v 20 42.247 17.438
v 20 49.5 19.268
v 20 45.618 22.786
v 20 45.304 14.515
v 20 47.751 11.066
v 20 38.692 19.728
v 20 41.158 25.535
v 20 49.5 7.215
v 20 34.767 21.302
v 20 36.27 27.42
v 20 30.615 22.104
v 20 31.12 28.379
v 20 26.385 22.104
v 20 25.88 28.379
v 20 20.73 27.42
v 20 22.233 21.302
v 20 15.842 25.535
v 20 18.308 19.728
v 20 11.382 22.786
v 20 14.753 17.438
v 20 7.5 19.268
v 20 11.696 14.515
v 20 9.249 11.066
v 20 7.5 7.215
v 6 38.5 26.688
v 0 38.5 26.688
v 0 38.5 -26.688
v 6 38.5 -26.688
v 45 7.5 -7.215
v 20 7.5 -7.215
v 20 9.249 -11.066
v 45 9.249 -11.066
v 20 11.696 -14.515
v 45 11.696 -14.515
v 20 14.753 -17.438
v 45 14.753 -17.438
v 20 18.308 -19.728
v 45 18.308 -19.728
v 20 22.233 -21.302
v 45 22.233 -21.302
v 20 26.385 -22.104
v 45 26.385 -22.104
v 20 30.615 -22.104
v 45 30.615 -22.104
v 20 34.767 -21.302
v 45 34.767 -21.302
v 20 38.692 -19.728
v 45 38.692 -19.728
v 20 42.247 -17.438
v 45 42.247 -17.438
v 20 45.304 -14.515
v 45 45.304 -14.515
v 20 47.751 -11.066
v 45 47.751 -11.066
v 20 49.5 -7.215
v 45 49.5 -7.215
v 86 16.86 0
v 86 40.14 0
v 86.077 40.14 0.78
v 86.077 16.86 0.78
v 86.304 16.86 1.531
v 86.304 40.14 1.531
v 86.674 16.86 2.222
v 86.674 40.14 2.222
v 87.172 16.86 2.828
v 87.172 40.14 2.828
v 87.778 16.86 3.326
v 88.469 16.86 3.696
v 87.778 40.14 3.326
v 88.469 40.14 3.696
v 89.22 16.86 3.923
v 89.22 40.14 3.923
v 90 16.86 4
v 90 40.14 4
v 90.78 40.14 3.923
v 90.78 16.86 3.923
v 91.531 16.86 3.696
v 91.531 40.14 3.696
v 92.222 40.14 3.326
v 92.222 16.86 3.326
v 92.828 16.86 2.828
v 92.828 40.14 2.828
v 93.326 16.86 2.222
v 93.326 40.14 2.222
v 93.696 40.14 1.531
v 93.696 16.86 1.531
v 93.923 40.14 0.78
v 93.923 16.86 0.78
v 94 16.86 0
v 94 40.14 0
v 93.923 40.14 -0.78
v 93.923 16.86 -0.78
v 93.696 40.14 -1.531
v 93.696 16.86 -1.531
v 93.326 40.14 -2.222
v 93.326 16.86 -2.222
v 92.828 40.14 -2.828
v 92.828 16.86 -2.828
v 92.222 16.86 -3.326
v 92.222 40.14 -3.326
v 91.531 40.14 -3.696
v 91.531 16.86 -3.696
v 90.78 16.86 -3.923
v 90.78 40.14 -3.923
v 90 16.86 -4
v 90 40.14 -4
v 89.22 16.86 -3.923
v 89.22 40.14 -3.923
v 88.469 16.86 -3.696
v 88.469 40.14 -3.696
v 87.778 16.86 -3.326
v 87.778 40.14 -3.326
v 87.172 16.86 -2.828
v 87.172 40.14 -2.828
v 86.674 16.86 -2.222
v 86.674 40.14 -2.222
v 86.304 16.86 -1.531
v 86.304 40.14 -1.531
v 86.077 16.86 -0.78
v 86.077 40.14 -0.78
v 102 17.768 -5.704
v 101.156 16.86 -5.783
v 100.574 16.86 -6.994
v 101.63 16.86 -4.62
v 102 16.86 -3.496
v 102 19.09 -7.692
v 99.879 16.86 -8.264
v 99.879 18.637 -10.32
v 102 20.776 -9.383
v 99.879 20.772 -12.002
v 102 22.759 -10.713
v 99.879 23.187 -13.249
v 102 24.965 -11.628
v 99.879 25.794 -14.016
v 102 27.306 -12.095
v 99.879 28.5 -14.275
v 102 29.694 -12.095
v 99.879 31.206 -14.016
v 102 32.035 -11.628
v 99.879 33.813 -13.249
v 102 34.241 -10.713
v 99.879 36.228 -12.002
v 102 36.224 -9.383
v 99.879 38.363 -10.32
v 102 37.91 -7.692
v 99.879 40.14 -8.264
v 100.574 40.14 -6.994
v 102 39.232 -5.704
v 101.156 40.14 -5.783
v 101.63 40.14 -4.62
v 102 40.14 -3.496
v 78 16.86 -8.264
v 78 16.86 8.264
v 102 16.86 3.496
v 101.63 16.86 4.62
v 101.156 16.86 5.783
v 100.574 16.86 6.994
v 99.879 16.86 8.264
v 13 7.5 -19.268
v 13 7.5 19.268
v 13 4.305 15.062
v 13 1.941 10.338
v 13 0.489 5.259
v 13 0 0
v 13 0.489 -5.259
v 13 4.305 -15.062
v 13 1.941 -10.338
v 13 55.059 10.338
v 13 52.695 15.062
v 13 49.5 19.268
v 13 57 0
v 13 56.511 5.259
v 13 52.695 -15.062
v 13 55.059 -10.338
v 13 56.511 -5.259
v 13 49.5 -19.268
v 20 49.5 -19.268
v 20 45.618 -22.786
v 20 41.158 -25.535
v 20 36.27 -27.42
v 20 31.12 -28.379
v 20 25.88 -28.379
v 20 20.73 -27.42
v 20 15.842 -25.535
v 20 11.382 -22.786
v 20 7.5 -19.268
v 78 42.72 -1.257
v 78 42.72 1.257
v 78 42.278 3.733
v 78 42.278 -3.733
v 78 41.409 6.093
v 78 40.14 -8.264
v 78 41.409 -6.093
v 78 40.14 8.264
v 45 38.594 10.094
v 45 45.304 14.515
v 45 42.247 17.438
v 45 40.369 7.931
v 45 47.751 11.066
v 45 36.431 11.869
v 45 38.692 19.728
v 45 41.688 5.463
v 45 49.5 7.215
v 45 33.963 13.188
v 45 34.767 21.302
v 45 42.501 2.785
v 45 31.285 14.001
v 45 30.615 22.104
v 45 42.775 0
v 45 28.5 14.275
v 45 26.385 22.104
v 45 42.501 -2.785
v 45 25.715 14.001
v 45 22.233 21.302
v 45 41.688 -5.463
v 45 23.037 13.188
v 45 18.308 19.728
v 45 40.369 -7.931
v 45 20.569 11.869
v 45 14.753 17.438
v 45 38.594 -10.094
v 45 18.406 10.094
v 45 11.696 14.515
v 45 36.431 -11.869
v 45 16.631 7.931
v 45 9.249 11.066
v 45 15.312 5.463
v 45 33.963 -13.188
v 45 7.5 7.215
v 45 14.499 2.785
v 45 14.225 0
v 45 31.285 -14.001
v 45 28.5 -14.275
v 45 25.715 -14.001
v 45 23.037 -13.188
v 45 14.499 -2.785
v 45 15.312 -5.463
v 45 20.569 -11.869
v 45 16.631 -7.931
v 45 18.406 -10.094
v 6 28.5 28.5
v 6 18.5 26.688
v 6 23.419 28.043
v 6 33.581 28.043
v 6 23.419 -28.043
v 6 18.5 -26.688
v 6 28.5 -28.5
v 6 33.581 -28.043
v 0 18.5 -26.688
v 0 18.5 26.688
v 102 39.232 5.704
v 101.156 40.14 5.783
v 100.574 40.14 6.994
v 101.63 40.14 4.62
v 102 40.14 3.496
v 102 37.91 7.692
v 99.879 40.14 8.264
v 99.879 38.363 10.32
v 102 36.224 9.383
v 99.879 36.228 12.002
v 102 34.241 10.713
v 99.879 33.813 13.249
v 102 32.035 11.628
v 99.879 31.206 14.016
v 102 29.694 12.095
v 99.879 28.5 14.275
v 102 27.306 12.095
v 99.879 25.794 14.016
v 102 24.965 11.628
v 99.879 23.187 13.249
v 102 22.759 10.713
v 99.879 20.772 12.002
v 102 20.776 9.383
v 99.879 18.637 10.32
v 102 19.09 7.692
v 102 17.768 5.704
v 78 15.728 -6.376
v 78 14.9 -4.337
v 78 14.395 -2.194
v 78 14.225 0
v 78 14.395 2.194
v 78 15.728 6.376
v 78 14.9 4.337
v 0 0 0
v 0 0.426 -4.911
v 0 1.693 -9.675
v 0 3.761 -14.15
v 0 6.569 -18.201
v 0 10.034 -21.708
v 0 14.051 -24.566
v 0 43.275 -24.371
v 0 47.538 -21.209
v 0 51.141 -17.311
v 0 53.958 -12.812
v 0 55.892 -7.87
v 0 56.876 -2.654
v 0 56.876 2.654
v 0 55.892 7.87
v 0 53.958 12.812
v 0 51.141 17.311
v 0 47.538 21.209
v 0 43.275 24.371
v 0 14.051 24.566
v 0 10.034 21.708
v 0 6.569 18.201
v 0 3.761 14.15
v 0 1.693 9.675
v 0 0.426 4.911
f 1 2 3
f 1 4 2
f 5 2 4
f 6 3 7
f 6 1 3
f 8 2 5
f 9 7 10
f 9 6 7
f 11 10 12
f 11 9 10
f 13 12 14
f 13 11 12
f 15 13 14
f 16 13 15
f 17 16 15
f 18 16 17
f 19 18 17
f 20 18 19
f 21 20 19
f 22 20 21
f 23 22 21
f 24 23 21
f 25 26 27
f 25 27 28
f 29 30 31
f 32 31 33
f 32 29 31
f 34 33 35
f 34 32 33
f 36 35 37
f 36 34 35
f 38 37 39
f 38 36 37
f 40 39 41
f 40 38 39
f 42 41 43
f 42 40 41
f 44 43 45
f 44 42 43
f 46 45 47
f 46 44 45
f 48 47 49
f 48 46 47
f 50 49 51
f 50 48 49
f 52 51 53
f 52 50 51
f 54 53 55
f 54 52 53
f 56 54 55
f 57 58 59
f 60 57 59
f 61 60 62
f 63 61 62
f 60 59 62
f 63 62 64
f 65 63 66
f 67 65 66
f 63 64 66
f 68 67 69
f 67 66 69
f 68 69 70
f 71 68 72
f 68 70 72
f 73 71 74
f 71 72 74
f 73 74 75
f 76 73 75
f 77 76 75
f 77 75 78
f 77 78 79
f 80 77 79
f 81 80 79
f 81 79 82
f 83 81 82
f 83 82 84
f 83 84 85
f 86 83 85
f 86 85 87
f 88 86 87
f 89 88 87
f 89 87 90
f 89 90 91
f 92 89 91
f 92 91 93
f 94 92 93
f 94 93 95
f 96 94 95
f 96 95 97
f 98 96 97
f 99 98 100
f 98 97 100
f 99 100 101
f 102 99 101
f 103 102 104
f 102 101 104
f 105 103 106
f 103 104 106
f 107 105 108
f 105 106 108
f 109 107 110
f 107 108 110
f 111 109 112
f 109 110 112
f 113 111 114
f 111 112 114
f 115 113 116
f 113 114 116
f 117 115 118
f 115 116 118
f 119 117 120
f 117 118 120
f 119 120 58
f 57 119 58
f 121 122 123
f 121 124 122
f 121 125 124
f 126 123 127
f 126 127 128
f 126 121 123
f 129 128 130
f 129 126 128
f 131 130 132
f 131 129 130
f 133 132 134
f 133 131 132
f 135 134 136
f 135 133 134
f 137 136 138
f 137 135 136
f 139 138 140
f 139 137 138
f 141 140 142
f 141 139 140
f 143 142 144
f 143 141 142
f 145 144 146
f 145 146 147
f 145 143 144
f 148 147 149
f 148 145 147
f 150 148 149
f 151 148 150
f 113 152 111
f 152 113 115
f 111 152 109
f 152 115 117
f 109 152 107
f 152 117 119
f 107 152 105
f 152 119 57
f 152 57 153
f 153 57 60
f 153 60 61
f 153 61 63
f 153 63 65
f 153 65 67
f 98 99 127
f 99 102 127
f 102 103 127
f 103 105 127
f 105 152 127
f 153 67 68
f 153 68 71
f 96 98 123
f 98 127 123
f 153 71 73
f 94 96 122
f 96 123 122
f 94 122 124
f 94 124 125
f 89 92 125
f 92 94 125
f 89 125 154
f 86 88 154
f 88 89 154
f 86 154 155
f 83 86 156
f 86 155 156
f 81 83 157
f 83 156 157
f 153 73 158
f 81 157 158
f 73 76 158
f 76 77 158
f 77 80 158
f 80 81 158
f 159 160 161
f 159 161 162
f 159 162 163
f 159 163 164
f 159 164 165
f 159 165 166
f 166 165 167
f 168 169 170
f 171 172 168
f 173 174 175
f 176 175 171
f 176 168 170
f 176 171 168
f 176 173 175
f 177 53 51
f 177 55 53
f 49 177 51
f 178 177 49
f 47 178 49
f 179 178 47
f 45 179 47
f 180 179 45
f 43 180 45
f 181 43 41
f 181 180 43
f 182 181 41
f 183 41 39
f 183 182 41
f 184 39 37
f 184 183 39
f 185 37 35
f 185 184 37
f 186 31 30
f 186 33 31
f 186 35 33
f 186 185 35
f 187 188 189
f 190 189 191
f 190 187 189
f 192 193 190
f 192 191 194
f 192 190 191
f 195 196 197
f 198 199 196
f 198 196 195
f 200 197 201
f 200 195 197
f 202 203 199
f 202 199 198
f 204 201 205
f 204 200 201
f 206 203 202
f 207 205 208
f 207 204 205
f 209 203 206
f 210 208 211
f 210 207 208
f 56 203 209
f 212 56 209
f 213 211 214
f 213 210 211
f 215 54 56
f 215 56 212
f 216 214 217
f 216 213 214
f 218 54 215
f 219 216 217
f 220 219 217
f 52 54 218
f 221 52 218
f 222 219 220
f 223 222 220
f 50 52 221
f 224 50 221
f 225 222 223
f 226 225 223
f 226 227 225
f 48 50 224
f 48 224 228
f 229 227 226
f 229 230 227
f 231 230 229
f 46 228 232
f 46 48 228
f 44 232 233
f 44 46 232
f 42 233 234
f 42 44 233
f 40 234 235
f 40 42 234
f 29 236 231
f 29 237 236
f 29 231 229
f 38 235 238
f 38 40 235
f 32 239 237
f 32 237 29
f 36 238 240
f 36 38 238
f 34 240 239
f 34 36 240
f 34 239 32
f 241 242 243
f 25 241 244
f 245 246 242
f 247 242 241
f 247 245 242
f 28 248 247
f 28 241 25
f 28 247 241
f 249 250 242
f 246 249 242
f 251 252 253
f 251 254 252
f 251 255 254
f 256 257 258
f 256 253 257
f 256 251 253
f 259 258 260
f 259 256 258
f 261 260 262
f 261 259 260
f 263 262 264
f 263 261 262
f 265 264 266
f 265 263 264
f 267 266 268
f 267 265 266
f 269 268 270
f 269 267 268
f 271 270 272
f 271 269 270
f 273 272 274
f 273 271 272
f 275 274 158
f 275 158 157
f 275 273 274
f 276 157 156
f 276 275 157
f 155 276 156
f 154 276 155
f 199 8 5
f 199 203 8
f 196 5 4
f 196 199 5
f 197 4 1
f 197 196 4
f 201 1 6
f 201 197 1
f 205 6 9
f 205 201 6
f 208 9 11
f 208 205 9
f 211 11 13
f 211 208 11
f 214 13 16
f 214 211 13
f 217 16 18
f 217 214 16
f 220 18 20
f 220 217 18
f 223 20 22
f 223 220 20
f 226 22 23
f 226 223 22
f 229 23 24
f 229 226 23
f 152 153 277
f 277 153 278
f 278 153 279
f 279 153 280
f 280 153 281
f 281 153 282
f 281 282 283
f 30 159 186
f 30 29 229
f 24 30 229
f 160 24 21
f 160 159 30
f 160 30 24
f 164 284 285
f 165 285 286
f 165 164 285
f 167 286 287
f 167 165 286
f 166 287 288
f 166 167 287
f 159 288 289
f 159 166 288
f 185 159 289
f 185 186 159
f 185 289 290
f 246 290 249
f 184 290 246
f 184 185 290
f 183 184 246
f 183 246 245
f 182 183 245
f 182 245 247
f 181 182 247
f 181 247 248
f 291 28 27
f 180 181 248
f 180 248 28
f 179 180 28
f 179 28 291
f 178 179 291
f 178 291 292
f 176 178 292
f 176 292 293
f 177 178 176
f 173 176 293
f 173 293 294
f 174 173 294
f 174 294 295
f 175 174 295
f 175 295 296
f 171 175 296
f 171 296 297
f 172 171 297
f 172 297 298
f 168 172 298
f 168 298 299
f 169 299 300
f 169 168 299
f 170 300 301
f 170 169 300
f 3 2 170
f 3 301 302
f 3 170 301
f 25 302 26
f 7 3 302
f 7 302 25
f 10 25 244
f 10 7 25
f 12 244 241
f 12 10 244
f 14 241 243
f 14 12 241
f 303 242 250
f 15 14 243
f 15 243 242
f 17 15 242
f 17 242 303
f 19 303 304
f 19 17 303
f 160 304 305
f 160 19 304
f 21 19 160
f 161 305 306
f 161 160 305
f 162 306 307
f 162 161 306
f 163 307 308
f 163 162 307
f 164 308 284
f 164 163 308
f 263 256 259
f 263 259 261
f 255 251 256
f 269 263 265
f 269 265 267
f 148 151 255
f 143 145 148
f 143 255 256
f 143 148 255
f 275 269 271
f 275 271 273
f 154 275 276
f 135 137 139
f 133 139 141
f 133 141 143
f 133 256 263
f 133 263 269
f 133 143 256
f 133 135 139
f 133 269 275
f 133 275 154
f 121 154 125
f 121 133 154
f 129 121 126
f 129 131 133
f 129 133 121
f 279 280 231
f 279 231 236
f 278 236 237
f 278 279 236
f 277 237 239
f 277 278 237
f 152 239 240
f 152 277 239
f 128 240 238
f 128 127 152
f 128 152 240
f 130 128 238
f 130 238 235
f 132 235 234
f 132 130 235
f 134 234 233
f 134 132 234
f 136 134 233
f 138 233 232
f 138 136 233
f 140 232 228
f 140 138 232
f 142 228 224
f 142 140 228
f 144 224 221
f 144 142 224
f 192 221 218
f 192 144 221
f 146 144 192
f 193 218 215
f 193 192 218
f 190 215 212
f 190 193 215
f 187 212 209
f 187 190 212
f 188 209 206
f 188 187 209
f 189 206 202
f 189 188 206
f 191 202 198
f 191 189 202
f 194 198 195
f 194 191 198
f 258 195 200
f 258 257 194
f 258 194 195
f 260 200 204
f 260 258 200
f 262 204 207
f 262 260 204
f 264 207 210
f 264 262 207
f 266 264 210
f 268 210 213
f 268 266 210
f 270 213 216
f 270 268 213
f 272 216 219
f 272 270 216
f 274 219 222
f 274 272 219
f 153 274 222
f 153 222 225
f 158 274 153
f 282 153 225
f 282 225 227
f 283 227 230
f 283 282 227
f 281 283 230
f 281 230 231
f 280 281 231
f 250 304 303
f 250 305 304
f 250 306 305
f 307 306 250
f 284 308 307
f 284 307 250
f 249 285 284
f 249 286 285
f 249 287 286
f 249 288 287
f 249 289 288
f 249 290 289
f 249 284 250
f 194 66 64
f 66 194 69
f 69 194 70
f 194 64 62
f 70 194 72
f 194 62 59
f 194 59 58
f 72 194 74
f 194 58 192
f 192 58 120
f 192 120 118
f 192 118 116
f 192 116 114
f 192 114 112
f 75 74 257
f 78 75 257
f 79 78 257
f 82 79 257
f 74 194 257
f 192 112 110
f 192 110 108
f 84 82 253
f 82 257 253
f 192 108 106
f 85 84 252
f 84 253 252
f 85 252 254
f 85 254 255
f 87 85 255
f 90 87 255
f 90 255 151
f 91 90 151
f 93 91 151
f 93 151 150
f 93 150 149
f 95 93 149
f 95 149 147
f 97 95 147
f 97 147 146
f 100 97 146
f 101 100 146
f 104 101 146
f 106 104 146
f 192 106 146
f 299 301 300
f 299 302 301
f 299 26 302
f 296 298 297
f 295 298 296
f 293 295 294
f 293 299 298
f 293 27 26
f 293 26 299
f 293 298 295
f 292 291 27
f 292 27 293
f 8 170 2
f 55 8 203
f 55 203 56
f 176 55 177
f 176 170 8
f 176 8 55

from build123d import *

# Parameters (mm, degrees)
CUT_EXTRUDE1_DEPTH      = 121.271567712
CUT_EXTRUDE1_DEPTH_BACK = 121.271567712
SKETCH1_6_W             = 6
SKETCH1_6_H             = 20
CUT_EXTRUDE2_DEPTH      = 24
SKETCH3_R               = 4
CUT_EXTRUDE3_DEPTH      = 114.258419555
CUT_EXTRUDE4_DEPTH      = 25
CUT_EXTRUDE4_DEPTH_BACK = 7


with BuildPart() as part:
    # Sketch1 → Revolve2 (revolve)
    with BuildSketch(Plane.XY):
        Polygon((0, 0), (20, 0), (20, 6.295), (45, 6.295), (45, 14.225), (99.878679656, 14.225), (102, 16.346320344), (102, 28.5), (0, 28.5), align=None)
    revolve(axis=Axis((0, 28.5, 0), (1, 0, 0)))

    # Sketch1<6> → Cut-Extrude1 (cut, two sides: drawn at the far end of the back side and taken through both)
    with BuildSketch(Plane.XY.offset(-CUT_EXTRUDE1_DEPTH_BACK)):
        with Locations((3, 28.5)):
            Rectangle(SKETCH1_6_W, SKETCH1_6_H)
    extrude(amount=CUT_EXTRUDE1_DEPTH + CUT_EXTRUDE1_DEPTH_BACK, mode=Mode.SUBTRACT)

    # Sketch2 → Cut-Extrude2 (cut)
    with BuildSketch(Plane(origin=(102, 0, 0), x_dir=(0, 0, -1), z_dir=(1, 0, 0))):
        with BuildLine():
            ThreePointArc((8.263535865, 40.14), (0, 42.775), (-8.263535865, 40.14))
            Line((-8.263535865, 40.14), (8.263535865, 40.14))
        make_face()
        with BuildLine():
            ThreePointArc((-8.263535865, 16.86), (0, 14.225), (8.263535865, 16.86))
            Line((8.263535865, 16.86), (-8.263535865, 16.86))
        make_face()
    extrude(amount=-CUT_EXTRUDE2_DEPTH, mode=Mode.SUBTRACT)

    # Sketch3 → Cut-Extrude3 (cut, through all)
    with BuildSketch(Plane(origin=(0, 40.14, 0), x_dir=(1, 0, 0), z_dir=(0, 1, 0))):
        with Locations((90, 0)):
            Circle(SKETCH3_R)
    extrude(amount=-CUT_EXTRUDE3_DEPTH, mode=Mode.SUBTRACT)

    # Sketch4 → Cut-Extrude4 (cut, two sides: drawn at the far end of the back side and taken through both)
    with BuildSketch(Plane(origin=(20, 0, 0), x_dir=(0, 0, -1), z_dir=(1, 0, 0)).offset(-CUT_EXTRUDE4_DEPTH_BACK)):
        with BuildLine():
            ThreePointArc((19.267848868, 49.5), (0, 57), (-19.267848868, 49.5))
            Line((-19.267848868, 49.5), (19.267848868, 49.5))
        make_face()
        with BuildLine():
            ThreePointArc((-19.267848868, 7.5), (0, 0), (19.267848868, 7.5))
            Line((19.267848868, 7.5), (-19.267848868, 7.5))
        make_face()
    extrude(amount=CUT_EXTRUDE4_DEPTH + CUT_EXTRUDE4_DEPTH_BACK, mode=Mode.SUBTRACT)


solid = part.part
